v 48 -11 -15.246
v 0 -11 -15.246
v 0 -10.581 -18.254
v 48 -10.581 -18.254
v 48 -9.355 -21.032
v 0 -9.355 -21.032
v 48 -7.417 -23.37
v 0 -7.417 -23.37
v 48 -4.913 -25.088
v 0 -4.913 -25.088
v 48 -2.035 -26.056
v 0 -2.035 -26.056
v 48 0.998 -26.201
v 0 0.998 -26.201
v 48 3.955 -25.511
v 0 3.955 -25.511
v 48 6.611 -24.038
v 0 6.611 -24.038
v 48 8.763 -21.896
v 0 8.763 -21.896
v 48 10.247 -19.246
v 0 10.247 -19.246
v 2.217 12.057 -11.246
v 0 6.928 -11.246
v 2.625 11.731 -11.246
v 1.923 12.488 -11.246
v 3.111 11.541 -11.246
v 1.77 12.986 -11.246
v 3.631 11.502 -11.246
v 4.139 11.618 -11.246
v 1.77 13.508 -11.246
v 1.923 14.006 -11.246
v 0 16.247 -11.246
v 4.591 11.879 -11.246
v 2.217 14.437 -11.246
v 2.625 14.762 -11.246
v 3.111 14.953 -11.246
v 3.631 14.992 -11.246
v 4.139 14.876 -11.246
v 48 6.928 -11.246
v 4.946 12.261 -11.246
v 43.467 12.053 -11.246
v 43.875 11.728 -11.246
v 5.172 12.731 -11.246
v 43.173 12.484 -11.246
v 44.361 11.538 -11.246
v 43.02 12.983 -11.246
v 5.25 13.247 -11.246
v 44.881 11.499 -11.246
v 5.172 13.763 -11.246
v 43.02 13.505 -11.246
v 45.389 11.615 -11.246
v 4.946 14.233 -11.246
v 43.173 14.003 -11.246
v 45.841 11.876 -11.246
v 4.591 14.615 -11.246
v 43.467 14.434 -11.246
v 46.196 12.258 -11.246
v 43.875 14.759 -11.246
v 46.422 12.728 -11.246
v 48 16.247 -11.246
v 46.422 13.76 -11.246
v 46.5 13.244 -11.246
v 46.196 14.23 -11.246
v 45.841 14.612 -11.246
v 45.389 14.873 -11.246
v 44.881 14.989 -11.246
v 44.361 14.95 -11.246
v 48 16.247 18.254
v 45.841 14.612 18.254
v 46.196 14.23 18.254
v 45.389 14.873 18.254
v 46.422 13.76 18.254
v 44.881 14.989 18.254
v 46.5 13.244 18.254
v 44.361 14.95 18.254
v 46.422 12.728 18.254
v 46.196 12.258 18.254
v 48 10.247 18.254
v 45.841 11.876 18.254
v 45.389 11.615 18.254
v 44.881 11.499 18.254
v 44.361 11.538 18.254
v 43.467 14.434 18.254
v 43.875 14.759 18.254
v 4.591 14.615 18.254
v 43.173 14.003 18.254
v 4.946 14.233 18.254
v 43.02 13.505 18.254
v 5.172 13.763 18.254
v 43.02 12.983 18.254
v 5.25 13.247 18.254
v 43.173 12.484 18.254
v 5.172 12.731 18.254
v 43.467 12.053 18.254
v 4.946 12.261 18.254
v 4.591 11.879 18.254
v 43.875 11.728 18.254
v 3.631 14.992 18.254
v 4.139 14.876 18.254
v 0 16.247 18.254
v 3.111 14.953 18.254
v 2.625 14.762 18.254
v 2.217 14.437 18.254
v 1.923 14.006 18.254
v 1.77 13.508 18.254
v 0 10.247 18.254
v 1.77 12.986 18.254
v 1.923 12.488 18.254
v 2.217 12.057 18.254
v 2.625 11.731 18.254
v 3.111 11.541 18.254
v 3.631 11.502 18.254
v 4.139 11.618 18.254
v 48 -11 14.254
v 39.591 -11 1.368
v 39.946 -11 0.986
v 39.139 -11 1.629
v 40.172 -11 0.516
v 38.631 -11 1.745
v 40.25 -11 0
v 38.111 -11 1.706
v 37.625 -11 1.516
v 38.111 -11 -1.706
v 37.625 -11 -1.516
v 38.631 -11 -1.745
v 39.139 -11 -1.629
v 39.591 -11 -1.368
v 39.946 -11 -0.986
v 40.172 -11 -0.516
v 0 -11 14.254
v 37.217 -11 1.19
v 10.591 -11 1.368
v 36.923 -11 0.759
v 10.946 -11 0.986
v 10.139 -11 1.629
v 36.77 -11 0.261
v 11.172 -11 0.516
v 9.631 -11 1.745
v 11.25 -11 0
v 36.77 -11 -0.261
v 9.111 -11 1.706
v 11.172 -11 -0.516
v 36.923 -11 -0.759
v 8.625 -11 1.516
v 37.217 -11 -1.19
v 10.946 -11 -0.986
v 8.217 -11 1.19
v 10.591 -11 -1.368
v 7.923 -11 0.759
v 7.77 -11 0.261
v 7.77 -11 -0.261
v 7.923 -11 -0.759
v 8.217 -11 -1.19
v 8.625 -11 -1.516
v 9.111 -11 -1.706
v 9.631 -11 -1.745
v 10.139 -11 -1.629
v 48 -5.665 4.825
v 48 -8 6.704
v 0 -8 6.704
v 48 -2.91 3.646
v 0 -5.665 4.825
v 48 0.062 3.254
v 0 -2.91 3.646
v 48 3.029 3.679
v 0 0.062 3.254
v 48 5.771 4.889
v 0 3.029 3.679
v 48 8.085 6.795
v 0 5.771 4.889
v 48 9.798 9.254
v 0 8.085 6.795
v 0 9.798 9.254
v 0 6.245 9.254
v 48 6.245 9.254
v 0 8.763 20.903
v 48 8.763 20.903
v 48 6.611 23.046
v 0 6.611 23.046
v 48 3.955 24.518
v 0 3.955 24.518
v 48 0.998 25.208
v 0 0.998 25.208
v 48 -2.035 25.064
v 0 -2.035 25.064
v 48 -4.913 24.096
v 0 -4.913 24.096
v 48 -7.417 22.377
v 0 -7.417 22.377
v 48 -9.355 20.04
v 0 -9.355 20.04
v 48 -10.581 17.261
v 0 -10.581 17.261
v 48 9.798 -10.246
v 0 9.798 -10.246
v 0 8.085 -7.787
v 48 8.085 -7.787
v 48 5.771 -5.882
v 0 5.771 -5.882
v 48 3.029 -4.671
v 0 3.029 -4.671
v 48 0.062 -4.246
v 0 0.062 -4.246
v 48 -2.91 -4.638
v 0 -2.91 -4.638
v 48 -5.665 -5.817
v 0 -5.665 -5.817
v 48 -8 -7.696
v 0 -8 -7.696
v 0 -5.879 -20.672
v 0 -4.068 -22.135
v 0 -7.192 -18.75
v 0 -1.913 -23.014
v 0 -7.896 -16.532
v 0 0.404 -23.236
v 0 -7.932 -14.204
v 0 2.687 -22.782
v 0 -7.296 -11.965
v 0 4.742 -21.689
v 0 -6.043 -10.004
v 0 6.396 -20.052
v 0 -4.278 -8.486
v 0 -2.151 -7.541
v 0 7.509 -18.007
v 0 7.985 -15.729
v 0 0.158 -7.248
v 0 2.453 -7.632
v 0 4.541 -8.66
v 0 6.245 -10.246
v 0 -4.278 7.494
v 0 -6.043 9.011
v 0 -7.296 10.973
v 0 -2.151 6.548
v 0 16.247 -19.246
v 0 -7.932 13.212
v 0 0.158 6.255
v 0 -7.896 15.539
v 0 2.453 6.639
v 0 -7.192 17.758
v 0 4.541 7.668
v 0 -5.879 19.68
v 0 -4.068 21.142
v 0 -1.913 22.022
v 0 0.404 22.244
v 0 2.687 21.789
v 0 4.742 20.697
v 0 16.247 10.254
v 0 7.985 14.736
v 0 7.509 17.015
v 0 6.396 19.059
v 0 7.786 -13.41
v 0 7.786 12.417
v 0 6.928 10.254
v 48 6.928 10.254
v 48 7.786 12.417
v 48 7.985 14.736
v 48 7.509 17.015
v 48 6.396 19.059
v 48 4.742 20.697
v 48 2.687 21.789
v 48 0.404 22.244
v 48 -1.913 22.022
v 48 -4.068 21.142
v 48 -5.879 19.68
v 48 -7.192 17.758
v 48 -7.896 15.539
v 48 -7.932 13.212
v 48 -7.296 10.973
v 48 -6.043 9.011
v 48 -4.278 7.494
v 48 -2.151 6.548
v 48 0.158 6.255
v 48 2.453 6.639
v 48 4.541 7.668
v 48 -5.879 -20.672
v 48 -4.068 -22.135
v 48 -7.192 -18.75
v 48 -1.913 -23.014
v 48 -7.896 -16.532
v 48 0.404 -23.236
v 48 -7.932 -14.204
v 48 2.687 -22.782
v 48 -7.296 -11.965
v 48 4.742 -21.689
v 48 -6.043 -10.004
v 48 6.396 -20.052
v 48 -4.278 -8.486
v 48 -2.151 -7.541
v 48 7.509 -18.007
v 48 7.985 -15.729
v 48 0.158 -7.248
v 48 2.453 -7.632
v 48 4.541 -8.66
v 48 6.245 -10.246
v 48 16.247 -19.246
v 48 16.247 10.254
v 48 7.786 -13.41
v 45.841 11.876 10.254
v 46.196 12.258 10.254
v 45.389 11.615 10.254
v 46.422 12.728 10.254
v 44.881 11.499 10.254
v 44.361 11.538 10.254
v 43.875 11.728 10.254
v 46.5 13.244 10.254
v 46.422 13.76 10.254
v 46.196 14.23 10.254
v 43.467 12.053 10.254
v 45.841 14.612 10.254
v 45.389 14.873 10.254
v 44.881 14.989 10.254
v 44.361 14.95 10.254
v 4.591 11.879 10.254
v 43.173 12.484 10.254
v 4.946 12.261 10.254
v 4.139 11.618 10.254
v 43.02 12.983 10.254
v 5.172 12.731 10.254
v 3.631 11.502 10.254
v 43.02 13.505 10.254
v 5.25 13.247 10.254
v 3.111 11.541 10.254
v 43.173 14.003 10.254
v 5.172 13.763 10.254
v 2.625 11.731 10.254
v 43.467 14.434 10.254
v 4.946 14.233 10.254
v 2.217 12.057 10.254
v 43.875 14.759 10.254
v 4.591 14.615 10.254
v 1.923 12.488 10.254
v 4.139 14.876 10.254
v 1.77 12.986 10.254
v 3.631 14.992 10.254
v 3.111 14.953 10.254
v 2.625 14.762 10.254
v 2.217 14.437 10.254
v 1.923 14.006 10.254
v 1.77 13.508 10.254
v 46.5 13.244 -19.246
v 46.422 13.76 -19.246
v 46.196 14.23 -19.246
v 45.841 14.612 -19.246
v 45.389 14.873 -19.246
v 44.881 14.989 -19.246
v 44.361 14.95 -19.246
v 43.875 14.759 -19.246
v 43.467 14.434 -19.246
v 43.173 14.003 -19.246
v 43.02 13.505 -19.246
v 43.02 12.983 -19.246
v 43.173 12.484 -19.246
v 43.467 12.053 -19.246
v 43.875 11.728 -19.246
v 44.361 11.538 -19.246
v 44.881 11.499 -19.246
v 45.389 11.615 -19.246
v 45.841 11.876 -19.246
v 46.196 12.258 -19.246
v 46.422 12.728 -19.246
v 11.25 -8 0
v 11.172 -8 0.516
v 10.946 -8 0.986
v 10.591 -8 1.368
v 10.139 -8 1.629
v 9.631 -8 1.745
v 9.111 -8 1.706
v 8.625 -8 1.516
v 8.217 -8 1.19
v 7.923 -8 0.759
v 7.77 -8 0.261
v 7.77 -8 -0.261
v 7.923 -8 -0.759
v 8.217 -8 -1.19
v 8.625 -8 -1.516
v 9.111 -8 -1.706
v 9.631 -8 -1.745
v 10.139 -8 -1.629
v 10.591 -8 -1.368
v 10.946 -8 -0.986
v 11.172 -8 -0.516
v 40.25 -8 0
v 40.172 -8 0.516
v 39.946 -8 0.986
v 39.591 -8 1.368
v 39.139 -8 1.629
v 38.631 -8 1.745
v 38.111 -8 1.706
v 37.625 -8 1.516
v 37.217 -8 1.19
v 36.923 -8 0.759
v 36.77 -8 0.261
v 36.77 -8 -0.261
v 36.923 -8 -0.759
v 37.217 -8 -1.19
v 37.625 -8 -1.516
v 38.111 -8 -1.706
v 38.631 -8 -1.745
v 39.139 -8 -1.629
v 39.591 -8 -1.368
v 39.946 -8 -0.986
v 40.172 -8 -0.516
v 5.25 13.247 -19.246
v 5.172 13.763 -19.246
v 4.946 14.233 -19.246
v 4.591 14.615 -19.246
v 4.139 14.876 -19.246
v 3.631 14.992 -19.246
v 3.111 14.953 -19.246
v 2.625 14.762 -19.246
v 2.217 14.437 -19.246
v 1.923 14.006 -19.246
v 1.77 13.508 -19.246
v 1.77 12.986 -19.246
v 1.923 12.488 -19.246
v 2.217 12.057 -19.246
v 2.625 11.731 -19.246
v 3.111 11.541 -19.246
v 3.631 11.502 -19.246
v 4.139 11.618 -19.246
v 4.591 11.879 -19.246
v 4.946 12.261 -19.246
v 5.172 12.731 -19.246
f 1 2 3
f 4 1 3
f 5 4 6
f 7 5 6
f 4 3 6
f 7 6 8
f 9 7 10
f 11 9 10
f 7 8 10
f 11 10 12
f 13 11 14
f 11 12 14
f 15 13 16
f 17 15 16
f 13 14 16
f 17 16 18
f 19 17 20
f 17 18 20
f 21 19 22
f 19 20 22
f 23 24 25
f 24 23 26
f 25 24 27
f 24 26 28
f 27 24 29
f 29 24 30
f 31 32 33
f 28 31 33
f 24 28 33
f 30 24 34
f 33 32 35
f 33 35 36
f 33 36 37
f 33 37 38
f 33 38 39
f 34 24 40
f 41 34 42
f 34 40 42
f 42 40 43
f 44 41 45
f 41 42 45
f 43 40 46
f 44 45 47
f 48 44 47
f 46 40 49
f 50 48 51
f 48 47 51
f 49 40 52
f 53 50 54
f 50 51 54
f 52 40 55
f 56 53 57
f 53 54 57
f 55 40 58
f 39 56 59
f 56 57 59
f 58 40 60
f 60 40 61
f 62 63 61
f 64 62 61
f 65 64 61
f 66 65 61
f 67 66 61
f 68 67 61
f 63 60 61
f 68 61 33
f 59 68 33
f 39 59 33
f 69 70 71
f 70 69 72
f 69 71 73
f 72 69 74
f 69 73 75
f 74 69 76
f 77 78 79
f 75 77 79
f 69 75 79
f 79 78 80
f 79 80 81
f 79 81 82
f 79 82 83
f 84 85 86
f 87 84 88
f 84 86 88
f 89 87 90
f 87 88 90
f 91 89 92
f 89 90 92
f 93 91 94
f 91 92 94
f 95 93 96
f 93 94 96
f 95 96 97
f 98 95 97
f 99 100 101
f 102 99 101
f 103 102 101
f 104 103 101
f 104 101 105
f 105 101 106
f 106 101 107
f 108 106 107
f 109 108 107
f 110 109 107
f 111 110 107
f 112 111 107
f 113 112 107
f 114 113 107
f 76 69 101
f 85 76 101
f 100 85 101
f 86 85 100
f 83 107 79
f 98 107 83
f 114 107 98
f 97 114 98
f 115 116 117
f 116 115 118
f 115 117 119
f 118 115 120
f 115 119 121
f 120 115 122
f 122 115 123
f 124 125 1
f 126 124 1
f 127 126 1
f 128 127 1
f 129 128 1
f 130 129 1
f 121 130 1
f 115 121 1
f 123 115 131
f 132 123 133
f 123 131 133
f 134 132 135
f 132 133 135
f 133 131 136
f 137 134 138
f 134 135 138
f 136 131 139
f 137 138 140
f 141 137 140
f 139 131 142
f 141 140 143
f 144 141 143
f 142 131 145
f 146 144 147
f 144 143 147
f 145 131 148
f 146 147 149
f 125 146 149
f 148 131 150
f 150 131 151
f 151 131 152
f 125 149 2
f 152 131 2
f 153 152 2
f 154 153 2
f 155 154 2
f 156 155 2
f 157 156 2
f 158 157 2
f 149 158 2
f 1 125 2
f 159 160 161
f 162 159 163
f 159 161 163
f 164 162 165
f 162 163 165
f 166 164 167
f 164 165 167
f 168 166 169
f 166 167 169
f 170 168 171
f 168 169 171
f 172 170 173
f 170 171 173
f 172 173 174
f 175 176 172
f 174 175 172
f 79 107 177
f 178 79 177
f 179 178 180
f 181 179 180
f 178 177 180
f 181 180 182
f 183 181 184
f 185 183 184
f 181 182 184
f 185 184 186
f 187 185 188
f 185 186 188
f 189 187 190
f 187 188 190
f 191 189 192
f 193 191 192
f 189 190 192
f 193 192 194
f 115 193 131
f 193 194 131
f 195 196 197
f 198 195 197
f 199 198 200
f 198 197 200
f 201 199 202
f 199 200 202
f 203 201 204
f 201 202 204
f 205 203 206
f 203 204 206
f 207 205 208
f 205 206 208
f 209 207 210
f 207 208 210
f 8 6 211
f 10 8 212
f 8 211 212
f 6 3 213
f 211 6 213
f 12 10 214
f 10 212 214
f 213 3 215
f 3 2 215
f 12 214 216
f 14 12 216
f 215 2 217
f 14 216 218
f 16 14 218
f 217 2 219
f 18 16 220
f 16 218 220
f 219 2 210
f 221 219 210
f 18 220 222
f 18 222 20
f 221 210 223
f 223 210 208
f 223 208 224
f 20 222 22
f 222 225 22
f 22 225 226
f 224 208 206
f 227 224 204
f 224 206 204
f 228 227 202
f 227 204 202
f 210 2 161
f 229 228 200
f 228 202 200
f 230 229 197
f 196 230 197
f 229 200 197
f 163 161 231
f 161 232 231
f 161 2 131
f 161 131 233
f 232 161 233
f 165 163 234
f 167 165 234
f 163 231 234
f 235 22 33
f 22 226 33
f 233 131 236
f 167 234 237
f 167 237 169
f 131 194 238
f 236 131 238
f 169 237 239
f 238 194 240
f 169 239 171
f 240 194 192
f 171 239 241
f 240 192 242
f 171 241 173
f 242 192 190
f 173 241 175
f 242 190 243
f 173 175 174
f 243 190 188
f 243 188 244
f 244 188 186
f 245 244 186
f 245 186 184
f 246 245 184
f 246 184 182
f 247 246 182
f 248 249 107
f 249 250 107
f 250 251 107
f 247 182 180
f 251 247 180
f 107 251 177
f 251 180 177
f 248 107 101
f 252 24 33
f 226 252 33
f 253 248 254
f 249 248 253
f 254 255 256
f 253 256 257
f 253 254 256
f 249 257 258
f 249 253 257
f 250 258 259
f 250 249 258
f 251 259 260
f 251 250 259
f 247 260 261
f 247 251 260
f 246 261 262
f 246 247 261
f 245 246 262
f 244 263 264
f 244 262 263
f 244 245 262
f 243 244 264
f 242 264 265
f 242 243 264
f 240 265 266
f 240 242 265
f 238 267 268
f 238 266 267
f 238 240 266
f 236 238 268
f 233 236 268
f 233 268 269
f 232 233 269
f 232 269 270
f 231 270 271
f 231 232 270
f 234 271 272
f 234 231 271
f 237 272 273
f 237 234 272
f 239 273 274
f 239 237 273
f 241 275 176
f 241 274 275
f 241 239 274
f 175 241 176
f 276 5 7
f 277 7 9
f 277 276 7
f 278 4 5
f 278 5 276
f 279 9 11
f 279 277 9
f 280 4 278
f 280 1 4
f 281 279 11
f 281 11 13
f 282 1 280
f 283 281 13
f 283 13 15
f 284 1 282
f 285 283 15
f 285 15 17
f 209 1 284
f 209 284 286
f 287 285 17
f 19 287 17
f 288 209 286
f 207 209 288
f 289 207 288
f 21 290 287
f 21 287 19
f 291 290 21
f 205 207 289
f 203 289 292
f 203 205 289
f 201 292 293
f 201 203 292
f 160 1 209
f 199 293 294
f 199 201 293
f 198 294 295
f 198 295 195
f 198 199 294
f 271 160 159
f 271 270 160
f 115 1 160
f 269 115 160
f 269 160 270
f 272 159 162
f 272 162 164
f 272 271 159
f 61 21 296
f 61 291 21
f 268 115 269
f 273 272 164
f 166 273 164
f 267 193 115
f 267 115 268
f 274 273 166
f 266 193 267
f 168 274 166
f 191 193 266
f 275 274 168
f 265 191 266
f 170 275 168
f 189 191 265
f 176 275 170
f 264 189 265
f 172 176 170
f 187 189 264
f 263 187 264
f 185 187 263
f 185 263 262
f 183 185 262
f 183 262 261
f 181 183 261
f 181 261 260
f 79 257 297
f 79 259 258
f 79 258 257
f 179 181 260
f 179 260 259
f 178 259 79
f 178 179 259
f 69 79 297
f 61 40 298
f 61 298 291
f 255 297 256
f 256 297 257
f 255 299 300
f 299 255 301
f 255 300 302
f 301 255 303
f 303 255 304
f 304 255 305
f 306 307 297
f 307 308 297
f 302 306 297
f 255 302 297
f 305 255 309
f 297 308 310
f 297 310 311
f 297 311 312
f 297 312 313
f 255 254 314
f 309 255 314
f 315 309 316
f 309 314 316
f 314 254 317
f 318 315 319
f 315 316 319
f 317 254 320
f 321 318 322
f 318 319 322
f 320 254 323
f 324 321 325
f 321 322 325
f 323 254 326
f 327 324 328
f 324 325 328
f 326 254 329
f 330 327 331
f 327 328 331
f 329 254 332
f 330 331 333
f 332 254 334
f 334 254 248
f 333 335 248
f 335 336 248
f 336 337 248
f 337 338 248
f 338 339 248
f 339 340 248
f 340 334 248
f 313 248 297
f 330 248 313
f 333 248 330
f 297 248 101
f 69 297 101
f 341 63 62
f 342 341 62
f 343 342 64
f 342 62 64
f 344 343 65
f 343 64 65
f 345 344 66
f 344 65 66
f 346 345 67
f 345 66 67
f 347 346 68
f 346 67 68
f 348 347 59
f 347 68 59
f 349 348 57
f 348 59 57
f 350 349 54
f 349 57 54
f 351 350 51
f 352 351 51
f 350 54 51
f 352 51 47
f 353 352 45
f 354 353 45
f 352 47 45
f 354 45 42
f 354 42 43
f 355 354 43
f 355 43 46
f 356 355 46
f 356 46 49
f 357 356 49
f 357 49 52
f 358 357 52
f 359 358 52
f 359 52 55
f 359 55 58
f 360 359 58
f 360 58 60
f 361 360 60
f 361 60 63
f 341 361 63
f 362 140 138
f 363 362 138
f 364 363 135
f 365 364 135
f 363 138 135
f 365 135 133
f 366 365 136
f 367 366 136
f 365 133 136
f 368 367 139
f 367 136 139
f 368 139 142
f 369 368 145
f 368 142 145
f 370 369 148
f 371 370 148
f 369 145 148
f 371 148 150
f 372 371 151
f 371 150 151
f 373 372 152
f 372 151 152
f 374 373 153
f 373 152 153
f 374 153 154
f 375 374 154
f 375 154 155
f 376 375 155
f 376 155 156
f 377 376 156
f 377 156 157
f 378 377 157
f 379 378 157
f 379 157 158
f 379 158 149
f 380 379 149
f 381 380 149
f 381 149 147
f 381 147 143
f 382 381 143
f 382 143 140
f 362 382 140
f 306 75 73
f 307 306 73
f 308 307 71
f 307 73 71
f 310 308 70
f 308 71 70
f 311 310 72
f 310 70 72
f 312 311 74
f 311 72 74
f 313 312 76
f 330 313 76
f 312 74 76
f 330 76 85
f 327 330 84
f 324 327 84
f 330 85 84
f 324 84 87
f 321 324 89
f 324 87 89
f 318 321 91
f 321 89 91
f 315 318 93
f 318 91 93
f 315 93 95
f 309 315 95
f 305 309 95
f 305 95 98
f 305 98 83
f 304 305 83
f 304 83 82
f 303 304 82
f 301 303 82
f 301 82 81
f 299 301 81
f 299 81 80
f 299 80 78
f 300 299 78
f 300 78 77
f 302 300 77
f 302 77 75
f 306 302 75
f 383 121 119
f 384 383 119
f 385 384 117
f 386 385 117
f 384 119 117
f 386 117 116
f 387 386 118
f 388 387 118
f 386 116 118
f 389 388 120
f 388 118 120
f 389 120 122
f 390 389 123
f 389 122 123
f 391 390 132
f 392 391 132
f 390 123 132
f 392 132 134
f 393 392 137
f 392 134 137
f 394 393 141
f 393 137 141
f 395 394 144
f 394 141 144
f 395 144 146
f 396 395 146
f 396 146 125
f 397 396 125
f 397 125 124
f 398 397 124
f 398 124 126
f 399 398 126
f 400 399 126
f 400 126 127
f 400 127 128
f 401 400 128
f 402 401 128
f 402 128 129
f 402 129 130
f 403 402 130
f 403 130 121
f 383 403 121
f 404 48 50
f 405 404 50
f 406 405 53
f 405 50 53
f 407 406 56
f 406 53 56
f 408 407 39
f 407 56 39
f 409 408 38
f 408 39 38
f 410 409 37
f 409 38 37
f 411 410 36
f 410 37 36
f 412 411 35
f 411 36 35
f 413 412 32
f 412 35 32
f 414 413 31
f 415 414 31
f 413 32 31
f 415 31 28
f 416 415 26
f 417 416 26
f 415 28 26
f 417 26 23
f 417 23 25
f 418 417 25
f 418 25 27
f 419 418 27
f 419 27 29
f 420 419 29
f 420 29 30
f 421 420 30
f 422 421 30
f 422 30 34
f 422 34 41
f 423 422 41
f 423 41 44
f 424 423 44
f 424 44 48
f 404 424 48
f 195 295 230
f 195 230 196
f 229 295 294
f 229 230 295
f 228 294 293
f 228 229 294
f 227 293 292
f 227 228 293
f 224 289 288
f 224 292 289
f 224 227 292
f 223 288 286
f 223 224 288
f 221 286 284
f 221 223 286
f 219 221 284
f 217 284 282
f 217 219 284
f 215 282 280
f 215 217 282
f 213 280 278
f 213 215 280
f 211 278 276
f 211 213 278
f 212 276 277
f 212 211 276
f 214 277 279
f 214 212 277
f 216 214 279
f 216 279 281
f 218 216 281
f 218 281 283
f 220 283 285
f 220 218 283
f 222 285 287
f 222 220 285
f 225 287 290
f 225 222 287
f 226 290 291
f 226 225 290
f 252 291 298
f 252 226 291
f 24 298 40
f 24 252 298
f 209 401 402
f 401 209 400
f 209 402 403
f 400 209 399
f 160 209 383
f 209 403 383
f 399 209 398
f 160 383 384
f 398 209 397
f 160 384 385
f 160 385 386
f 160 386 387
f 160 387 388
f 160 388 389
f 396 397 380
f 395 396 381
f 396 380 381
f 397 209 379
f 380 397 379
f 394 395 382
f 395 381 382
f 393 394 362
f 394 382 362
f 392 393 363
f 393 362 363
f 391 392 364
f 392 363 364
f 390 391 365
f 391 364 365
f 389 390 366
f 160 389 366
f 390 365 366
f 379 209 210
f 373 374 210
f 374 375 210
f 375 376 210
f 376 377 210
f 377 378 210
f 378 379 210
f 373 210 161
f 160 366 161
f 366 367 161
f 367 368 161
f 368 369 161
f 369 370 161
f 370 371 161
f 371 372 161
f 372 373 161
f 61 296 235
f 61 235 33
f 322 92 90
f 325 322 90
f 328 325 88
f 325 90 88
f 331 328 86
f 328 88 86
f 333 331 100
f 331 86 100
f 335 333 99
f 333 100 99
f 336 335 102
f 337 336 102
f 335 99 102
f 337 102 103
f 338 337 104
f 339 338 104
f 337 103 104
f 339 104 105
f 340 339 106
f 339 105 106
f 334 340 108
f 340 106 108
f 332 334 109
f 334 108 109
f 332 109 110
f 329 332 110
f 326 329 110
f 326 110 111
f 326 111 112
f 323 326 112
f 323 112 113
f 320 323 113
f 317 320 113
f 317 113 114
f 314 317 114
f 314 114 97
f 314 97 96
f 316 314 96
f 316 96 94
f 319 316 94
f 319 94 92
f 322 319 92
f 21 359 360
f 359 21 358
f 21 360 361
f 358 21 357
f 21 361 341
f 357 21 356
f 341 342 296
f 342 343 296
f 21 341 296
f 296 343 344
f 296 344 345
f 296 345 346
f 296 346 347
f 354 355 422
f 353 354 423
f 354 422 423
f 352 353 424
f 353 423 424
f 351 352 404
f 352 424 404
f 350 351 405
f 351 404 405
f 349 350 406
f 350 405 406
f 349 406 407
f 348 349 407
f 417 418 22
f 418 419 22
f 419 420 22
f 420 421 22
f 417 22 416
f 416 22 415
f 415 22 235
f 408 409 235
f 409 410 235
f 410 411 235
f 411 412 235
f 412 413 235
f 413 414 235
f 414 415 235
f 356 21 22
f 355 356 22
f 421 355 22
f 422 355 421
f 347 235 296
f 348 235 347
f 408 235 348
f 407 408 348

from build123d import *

# Parameters (mm, degrees)
F1_R     = 8
F2_DEPTH = 48
F3_R     = 1.75
F4_DEPTH = 5
F5_R     = 1.75
F6_DEPTH = 50
F7_W     = 4.0019527676
F7_H     = 1
F8_DEPTH = 80


with BuildPart() as f2:
    # F1 (on Right) → F2 (new body)
    with BuildSketch(Plane.YZ):
        with BuildLine():
            ThreePointArc((-11, 14.2537585227), (-10.2225241501, 10.1917393204), (-8, 6.7039240874))
            ThreePointArc((-8, 6.7039240874), (2.1006018341, 3.4561906514), (10.246950766, 10.2537585227))
            ThreePointArc((10.246950766, 10.2537585227), (10.810098483, 12.218624427), (11, 14.2537585227))
            ThreePointArc((11, 14.2537585227), (10.810098483, 16.2888926183), (10.246950766, 18.2537585227))
            ThreePointArc((10.246950766, 18.2537585227), (-2.0351340956, 25.0638570057), (-11, 14.2537585227))
        make_face()
        with Locations((0, 14.2537585227)):
            Circle(F1_R, mode=Mode.SUBTRACT)
        with BuildLine():
            ThreePointArc((-11, -15.2462414773), (-10.2225241501, -11.184222275), (-8, -7.6964070421))
            Line((-8, -7.6964070421), (-8, 6.7039240874))
            ThreePointArc((-8, 6.7039240874), (-10.2225241501, 10.1917393204), (-11, 14.2537585227))
            Line((-11, 14.2537585227), (-11, -15.2462414773))
        make_face()
        with BuildLine():
            ThreePointArc((10.246950766, -19.2462414773), (10.810098483, -17.281375573), (11, -15.2462414773))
            ThreePointArc((11, -15.2462414773), (10.810098483, -13.2111073817), (10.246950766, -11.2462414773))
            ThreePointArc((10.246950766, -11.2462414773), (2.1006018341, -4.4486736061), (-8, -7.6964070421))
            ThreePointArc((-8, -7.6964070421), (-10.2225241501, -11.184222275), (-11, -15.2462414773))
            ThreePointArc((-11, -15.2462414773), (-2.0351340956, -26.0563399604), (10.246950766, -19.2462414773))
        make_face()
        with Locations((0, -15.2462414773)):
            Circle(F1_R, mode=Mode.SUBTRACT)
        with BuildLine():
            ThreePointArc((10.246950766, -11.2462414773), (10.810098483, -13.2111073817), (11, -15.2462414773))
            ThreePointArc((11, -15.2462414773), (10.810098483, -17.281375573), (10.246950766, -19.2462414773))
            Line((10.246950766, -19.2462414773), (16.246950766, -19.2462414773))
            Line((16.246950766, -19.2462414773), (16.246950766, -11.2462414773))
            Line((16.246950766, -11.2462414773), (10.246950766, -11.2462414773))
        make_face()
        with BuildLine():
            ThreePointArc((11, 14.2537585227), (10.810098483, 12.218624427), (10.246950766, 10.2537585227))
            Line((10.246950766, 10.2537585227), (16.246950766, 10.2537585227))
            Line((16.246950766, 10.2537585227), (16.246950766, 18.2537585227))
            Line((16.246950766, 18.2537585227), (10.246950766, 18.2537585227))
            ThreePointArc((10.246950766, 18.2537585227), (10.810098483, 16.2888926183), (11, 14.2537585227))
        make_face()
    extrude(amount=F2_DEPTH)

    # F3 (on face) → F4 (cut)
    with BuildSketch(Plane.XZ.offset(11)):
        with Locations((38.5, 0)):
            Circle(F3_R)
        with Locations((9.5, 0)):
            Circle(F3_R)
    extrude(amount=-F4_DEPTH, mode=Mode.SUBTRACT)

    # F5 (on face) → F6 (cut)
    with BuildSketch(Plane.XY.offset(18.2537585227)):
        with Locations((3.5, 13.246950766)):
            Circle(F5_R)
        with Locations((44.749999574, 13.243720019)):
            Circle(F5_R)
    extrude(amount=-F6_DEPTH, mode=Mode.SUBTRACT)

    # F7 (on face) → F8 (cut)
    with BuildSketch(Plane.YZ.offset(48)):
        with Locations((8.2459743822, 9.7537585227)):
            Rectangle(F7_W, F7_H)
        with Locations((8.2459743822, -10.7462414773)):
            Rectangle(F7_W, F7_H)
    extrude(amount=-F8_DEPTH, mode=Mode.SUBTRACT)


solid = f2.part
